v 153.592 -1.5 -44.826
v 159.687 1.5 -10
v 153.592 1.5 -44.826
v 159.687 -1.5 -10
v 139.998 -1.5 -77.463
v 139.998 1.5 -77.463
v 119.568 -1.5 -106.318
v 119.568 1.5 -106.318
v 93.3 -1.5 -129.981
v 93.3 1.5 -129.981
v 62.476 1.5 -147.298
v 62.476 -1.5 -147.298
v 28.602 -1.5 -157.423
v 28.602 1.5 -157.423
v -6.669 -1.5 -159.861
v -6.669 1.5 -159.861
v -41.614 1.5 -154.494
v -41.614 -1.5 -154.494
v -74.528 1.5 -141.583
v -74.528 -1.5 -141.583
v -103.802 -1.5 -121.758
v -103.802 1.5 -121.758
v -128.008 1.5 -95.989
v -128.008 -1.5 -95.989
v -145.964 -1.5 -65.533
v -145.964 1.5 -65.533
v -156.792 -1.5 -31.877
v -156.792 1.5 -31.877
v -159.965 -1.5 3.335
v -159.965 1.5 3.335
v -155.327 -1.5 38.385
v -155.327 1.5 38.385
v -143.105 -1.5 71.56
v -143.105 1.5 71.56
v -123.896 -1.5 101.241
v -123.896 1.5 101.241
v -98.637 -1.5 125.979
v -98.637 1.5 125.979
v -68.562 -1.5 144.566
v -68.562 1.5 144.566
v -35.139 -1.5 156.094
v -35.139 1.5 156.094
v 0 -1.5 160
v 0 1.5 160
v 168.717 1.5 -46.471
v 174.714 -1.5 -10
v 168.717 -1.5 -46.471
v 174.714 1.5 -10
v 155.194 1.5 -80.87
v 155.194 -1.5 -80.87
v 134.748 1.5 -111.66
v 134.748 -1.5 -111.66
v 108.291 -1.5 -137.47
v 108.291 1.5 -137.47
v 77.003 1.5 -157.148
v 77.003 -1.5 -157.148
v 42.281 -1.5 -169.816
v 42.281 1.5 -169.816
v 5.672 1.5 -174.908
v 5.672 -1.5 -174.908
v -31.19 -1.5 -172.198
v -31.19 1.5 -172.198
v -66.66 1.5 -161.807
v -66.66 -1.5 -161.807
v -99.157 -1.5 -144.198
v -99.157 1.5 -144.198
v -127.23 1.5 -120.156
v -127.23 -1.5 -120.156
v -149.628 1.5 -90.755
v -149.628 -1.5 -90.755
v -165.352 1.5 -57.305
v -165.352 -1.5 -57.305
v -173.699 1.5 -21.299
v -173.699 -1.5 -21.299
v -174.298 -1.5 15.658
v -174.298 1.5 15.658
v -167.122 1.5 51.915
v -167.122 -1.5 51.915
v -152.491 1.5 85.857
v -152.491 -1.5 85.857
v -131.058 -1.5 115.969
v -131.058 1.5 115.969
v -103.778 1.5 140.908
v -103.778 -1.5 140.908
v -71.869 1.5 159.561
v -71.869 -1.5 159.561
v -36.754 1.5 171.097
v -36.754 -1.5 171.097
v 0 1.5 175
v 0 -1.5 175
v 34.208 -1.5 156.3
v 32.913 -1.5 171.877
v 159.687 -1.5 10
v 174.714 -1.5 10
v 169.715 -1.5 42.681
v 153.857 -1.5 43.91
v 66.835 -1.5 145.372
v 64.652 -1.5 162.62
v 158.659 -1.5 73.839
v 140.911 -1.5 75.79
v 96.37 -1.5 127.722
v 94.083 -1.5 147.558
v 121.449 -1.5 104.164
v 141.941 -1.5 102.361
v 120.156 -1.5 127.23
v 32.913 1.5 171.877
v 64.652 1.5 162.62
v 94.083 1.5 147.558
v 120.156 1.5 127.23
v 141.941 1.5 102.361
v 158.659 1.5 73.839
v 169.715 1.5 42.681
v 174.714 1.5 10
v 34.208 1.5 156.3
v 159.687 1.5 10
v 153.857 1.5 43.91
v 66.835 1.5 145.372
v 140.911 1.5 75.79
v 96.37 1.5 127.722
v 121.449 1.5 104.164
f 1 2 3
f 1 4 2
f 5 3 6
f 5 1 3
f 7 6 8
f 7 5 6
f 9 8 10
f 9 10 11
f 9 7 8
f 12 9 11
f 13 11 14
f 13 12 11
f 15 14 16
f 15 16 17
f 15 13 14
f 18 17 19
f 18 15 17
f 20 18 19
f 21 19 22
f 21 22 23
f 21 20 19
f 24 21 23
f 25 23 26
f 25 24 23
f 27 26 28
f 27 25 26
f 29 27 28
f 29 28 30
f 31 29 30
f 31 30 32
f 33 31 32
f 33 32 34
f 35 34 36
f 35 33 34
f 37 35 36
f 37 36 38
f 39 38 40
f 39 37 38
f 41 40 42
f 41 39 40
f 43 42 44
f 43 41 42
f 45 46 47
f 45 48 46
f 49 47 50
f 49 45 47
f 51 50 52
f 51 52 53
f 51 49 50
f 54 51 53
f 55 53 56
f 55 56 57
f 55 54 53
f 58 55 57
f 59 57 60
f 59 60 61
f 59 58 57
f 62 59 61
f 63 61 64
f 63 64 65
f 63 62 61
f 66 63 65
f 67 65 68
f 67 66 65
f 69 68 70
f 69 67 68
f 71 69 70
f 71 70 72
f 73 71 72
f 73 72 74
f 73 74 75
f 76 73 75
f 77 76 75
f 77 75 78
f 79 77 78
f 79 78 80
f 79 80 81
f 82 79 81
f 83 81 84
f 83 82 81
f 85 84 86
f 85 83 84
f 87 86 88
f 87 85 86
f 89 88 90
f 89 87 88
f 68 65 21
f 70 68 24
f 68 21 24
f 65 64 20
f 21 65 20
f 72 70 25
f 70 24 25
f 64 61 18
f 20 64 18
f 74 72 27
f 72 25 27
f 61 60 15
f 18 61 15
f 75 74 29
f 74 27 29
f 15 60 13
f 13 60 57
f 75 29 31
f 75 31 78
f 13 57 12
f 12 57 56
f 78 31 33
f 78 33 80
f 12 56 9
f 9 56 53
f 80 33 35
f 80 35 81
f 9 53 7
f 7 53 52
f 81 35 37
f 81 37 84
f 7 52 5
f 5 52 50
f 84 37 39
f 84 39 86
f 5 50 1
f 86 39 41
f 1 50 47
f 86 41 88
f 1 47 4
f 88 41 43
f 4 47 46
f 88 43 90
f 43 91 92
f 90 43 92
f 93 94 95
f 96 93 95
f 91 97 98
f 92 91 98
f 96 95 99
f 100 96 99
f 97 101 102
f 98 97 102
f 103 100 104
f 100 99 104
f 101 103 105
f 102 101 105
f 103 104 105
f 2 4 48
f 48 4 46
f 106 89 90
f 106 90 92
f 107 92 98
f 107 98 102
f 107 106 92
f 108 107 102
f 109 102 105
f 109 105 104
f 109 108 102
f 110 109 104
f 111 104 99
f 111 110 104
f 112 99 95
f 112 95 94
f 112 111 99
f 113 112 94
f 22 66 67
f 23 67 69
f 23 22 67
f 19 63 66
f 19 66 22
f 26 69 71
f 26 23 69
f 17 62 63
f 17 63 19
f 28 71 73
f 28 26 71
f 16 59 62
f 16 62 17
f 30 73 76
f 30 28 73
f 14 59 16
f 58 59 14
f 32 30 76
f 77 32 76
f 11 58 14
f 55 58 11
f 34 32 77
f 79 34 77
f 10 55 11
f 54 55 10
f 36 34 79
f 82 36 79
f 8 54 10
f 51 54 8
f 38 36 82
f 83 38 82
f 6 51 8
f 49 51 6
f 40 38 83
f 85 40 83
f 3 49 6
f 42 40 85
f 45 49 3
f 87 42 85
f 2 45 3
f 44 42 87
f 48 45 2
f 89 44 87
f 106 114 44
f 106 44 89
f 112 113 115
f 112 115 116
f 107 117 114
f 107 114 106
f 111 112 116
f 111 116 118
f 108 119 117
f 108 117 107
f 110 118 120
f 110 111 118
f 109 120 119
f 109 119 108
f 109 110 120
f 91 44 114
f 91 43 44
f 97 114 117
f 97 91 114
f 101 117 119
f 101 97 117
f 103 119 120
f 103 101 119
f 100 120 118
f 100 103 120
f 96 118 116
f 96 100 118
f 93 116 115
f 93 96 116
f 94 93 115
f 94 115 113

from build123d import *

# Parameters (mm, degrees)
SKETCH1_R           = 175
SKETCH1_R_2         = 160
BOSS_EXTRUDE1_DEPTH = 1.5
AXIS_GAP_DEPTH      = 248.49191906
AXIS_GAP_DEPTH_BACK = 248.49191906
SKETCH2_W           = 32.609126468
SKETCH2_H           = 20


with BuildPart() as part:
    # Sketch1 → Boss-Extrude1 (new, symmetric)
    with BuildSketch(Plane(origin=(0, 0, 0), x_dir=(1, 0, 0), z_dir=(0, 1, 0))):
        with Locations(Location((0, 0, 0), (0, 0, 270))):
            Circle(SKETCH1_R)
        with Locations(Location((0, 0, 0), (0, 0, 270))):
            Circle(SKETCH1_R_2, mode=Mode.SUBTRACT)
    extrude(amount=BOSS_EXTRUDE1_DEPTH, both=True)

    # Sketch2 → axis gap (cut, two sides: drawn at the far end of the back side and taken through both)
    with BuildSketch(Plane(origin=(0, 0, 0), x_dir=(1, 0, 0), z_dir=(0, 1, 0)).offset(-AXIS_GAP_DEPTH_BACK)):
        with Locations((167.5, 0)):
            Rectangle(SKETCH2_W, SKETCH2_H)
    extrude(amount=AXIS_GAP_DEPTH + AXIS_GAP_DEPTH_BACK, mode=Mode.SUBTRACT)


solid = part.part
